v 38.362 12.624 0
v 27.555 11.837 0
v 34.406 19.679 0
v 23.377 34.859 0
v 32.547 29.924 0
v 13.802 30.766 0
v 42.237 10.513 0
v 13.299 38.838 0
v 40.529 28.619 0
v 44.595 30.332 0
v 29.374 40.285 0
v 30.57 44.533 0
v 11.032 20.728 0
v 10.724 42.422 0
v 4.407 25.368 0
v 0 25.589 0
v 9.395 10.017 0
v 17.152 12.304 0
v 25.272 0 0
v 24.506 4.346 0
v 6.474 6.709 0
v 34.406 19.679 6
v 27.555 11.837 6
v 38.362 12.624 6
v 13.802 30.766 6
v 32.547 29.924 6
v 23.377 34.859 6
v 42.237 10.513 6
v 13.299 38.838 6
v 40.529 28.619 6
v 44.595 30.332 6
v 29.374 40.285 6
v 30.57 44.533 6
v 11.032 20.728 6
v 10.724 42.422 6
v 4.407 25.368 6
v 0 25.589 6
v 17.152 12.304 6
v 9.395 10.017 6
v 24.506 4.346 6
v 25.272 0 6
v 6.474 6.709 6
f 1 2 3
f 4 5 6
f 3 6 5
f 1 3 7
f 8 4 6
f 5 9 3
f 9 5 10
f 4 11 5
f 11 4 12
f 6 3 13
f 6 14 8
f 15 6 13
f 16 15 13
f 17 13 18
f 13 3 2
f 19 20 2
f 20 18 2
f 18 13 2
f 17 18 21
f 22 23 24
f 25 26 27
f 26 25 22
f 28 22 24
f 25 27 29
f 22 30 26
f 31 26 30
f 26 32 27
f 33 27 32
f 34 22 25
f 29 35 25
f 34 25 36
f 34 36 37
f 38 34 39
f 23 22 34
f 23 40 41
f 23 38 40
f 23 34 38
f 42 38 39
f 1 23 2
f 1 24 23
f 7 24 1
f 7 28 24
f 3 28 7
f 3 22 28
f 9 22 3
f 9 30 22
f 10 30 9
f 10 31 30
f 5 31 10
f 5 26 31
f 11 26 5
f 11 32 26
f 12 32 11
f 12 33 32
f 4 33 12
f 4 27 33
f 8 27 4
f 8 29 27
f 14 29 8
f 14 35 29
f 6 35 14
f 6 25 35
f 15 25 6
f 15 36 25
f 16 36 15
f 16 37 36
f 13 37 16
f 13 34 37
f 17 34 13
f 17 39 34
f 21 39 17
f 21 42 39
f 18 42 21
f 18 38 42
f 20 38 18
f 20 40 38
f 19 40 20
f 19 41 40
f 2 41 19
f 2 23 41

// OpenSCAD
$fn = 32;

// ----------------------------------------------------------------------
// Fan rotor section: 7 blades, 12 mm hub radius, 11 mm blades
// ----------------------------------------------------------------------

// --- parameters (mm) ---
profile_height = 6;       // extrusion height
profile_points = 21;      // points of the closed outline

profile = [[34.406, 19.679], [40.529, 28.619], [44.595, 30.332], [32.547, 29.924], [29.374, 40.285], [30.57, 44.533], [23.377, 34.859], [13.299, 38.838], [10.724, 42.422], [13.802, 30.766], [4.407, 25.368], [0, 25.589], [11.032, 20.728], [9.395, 10.017], [6.474, 6.709], [17.152, 12.304], [24.506, 4.346], [25.272, 0], [27.555, 11.837], [38.362, 12.624], [42.237, 10.513]];  // single closed polygon, 21 points, counter clockwise

// --- the one profile operation ---
linear_extrude(height = profile_height) polygon(points = profile);
